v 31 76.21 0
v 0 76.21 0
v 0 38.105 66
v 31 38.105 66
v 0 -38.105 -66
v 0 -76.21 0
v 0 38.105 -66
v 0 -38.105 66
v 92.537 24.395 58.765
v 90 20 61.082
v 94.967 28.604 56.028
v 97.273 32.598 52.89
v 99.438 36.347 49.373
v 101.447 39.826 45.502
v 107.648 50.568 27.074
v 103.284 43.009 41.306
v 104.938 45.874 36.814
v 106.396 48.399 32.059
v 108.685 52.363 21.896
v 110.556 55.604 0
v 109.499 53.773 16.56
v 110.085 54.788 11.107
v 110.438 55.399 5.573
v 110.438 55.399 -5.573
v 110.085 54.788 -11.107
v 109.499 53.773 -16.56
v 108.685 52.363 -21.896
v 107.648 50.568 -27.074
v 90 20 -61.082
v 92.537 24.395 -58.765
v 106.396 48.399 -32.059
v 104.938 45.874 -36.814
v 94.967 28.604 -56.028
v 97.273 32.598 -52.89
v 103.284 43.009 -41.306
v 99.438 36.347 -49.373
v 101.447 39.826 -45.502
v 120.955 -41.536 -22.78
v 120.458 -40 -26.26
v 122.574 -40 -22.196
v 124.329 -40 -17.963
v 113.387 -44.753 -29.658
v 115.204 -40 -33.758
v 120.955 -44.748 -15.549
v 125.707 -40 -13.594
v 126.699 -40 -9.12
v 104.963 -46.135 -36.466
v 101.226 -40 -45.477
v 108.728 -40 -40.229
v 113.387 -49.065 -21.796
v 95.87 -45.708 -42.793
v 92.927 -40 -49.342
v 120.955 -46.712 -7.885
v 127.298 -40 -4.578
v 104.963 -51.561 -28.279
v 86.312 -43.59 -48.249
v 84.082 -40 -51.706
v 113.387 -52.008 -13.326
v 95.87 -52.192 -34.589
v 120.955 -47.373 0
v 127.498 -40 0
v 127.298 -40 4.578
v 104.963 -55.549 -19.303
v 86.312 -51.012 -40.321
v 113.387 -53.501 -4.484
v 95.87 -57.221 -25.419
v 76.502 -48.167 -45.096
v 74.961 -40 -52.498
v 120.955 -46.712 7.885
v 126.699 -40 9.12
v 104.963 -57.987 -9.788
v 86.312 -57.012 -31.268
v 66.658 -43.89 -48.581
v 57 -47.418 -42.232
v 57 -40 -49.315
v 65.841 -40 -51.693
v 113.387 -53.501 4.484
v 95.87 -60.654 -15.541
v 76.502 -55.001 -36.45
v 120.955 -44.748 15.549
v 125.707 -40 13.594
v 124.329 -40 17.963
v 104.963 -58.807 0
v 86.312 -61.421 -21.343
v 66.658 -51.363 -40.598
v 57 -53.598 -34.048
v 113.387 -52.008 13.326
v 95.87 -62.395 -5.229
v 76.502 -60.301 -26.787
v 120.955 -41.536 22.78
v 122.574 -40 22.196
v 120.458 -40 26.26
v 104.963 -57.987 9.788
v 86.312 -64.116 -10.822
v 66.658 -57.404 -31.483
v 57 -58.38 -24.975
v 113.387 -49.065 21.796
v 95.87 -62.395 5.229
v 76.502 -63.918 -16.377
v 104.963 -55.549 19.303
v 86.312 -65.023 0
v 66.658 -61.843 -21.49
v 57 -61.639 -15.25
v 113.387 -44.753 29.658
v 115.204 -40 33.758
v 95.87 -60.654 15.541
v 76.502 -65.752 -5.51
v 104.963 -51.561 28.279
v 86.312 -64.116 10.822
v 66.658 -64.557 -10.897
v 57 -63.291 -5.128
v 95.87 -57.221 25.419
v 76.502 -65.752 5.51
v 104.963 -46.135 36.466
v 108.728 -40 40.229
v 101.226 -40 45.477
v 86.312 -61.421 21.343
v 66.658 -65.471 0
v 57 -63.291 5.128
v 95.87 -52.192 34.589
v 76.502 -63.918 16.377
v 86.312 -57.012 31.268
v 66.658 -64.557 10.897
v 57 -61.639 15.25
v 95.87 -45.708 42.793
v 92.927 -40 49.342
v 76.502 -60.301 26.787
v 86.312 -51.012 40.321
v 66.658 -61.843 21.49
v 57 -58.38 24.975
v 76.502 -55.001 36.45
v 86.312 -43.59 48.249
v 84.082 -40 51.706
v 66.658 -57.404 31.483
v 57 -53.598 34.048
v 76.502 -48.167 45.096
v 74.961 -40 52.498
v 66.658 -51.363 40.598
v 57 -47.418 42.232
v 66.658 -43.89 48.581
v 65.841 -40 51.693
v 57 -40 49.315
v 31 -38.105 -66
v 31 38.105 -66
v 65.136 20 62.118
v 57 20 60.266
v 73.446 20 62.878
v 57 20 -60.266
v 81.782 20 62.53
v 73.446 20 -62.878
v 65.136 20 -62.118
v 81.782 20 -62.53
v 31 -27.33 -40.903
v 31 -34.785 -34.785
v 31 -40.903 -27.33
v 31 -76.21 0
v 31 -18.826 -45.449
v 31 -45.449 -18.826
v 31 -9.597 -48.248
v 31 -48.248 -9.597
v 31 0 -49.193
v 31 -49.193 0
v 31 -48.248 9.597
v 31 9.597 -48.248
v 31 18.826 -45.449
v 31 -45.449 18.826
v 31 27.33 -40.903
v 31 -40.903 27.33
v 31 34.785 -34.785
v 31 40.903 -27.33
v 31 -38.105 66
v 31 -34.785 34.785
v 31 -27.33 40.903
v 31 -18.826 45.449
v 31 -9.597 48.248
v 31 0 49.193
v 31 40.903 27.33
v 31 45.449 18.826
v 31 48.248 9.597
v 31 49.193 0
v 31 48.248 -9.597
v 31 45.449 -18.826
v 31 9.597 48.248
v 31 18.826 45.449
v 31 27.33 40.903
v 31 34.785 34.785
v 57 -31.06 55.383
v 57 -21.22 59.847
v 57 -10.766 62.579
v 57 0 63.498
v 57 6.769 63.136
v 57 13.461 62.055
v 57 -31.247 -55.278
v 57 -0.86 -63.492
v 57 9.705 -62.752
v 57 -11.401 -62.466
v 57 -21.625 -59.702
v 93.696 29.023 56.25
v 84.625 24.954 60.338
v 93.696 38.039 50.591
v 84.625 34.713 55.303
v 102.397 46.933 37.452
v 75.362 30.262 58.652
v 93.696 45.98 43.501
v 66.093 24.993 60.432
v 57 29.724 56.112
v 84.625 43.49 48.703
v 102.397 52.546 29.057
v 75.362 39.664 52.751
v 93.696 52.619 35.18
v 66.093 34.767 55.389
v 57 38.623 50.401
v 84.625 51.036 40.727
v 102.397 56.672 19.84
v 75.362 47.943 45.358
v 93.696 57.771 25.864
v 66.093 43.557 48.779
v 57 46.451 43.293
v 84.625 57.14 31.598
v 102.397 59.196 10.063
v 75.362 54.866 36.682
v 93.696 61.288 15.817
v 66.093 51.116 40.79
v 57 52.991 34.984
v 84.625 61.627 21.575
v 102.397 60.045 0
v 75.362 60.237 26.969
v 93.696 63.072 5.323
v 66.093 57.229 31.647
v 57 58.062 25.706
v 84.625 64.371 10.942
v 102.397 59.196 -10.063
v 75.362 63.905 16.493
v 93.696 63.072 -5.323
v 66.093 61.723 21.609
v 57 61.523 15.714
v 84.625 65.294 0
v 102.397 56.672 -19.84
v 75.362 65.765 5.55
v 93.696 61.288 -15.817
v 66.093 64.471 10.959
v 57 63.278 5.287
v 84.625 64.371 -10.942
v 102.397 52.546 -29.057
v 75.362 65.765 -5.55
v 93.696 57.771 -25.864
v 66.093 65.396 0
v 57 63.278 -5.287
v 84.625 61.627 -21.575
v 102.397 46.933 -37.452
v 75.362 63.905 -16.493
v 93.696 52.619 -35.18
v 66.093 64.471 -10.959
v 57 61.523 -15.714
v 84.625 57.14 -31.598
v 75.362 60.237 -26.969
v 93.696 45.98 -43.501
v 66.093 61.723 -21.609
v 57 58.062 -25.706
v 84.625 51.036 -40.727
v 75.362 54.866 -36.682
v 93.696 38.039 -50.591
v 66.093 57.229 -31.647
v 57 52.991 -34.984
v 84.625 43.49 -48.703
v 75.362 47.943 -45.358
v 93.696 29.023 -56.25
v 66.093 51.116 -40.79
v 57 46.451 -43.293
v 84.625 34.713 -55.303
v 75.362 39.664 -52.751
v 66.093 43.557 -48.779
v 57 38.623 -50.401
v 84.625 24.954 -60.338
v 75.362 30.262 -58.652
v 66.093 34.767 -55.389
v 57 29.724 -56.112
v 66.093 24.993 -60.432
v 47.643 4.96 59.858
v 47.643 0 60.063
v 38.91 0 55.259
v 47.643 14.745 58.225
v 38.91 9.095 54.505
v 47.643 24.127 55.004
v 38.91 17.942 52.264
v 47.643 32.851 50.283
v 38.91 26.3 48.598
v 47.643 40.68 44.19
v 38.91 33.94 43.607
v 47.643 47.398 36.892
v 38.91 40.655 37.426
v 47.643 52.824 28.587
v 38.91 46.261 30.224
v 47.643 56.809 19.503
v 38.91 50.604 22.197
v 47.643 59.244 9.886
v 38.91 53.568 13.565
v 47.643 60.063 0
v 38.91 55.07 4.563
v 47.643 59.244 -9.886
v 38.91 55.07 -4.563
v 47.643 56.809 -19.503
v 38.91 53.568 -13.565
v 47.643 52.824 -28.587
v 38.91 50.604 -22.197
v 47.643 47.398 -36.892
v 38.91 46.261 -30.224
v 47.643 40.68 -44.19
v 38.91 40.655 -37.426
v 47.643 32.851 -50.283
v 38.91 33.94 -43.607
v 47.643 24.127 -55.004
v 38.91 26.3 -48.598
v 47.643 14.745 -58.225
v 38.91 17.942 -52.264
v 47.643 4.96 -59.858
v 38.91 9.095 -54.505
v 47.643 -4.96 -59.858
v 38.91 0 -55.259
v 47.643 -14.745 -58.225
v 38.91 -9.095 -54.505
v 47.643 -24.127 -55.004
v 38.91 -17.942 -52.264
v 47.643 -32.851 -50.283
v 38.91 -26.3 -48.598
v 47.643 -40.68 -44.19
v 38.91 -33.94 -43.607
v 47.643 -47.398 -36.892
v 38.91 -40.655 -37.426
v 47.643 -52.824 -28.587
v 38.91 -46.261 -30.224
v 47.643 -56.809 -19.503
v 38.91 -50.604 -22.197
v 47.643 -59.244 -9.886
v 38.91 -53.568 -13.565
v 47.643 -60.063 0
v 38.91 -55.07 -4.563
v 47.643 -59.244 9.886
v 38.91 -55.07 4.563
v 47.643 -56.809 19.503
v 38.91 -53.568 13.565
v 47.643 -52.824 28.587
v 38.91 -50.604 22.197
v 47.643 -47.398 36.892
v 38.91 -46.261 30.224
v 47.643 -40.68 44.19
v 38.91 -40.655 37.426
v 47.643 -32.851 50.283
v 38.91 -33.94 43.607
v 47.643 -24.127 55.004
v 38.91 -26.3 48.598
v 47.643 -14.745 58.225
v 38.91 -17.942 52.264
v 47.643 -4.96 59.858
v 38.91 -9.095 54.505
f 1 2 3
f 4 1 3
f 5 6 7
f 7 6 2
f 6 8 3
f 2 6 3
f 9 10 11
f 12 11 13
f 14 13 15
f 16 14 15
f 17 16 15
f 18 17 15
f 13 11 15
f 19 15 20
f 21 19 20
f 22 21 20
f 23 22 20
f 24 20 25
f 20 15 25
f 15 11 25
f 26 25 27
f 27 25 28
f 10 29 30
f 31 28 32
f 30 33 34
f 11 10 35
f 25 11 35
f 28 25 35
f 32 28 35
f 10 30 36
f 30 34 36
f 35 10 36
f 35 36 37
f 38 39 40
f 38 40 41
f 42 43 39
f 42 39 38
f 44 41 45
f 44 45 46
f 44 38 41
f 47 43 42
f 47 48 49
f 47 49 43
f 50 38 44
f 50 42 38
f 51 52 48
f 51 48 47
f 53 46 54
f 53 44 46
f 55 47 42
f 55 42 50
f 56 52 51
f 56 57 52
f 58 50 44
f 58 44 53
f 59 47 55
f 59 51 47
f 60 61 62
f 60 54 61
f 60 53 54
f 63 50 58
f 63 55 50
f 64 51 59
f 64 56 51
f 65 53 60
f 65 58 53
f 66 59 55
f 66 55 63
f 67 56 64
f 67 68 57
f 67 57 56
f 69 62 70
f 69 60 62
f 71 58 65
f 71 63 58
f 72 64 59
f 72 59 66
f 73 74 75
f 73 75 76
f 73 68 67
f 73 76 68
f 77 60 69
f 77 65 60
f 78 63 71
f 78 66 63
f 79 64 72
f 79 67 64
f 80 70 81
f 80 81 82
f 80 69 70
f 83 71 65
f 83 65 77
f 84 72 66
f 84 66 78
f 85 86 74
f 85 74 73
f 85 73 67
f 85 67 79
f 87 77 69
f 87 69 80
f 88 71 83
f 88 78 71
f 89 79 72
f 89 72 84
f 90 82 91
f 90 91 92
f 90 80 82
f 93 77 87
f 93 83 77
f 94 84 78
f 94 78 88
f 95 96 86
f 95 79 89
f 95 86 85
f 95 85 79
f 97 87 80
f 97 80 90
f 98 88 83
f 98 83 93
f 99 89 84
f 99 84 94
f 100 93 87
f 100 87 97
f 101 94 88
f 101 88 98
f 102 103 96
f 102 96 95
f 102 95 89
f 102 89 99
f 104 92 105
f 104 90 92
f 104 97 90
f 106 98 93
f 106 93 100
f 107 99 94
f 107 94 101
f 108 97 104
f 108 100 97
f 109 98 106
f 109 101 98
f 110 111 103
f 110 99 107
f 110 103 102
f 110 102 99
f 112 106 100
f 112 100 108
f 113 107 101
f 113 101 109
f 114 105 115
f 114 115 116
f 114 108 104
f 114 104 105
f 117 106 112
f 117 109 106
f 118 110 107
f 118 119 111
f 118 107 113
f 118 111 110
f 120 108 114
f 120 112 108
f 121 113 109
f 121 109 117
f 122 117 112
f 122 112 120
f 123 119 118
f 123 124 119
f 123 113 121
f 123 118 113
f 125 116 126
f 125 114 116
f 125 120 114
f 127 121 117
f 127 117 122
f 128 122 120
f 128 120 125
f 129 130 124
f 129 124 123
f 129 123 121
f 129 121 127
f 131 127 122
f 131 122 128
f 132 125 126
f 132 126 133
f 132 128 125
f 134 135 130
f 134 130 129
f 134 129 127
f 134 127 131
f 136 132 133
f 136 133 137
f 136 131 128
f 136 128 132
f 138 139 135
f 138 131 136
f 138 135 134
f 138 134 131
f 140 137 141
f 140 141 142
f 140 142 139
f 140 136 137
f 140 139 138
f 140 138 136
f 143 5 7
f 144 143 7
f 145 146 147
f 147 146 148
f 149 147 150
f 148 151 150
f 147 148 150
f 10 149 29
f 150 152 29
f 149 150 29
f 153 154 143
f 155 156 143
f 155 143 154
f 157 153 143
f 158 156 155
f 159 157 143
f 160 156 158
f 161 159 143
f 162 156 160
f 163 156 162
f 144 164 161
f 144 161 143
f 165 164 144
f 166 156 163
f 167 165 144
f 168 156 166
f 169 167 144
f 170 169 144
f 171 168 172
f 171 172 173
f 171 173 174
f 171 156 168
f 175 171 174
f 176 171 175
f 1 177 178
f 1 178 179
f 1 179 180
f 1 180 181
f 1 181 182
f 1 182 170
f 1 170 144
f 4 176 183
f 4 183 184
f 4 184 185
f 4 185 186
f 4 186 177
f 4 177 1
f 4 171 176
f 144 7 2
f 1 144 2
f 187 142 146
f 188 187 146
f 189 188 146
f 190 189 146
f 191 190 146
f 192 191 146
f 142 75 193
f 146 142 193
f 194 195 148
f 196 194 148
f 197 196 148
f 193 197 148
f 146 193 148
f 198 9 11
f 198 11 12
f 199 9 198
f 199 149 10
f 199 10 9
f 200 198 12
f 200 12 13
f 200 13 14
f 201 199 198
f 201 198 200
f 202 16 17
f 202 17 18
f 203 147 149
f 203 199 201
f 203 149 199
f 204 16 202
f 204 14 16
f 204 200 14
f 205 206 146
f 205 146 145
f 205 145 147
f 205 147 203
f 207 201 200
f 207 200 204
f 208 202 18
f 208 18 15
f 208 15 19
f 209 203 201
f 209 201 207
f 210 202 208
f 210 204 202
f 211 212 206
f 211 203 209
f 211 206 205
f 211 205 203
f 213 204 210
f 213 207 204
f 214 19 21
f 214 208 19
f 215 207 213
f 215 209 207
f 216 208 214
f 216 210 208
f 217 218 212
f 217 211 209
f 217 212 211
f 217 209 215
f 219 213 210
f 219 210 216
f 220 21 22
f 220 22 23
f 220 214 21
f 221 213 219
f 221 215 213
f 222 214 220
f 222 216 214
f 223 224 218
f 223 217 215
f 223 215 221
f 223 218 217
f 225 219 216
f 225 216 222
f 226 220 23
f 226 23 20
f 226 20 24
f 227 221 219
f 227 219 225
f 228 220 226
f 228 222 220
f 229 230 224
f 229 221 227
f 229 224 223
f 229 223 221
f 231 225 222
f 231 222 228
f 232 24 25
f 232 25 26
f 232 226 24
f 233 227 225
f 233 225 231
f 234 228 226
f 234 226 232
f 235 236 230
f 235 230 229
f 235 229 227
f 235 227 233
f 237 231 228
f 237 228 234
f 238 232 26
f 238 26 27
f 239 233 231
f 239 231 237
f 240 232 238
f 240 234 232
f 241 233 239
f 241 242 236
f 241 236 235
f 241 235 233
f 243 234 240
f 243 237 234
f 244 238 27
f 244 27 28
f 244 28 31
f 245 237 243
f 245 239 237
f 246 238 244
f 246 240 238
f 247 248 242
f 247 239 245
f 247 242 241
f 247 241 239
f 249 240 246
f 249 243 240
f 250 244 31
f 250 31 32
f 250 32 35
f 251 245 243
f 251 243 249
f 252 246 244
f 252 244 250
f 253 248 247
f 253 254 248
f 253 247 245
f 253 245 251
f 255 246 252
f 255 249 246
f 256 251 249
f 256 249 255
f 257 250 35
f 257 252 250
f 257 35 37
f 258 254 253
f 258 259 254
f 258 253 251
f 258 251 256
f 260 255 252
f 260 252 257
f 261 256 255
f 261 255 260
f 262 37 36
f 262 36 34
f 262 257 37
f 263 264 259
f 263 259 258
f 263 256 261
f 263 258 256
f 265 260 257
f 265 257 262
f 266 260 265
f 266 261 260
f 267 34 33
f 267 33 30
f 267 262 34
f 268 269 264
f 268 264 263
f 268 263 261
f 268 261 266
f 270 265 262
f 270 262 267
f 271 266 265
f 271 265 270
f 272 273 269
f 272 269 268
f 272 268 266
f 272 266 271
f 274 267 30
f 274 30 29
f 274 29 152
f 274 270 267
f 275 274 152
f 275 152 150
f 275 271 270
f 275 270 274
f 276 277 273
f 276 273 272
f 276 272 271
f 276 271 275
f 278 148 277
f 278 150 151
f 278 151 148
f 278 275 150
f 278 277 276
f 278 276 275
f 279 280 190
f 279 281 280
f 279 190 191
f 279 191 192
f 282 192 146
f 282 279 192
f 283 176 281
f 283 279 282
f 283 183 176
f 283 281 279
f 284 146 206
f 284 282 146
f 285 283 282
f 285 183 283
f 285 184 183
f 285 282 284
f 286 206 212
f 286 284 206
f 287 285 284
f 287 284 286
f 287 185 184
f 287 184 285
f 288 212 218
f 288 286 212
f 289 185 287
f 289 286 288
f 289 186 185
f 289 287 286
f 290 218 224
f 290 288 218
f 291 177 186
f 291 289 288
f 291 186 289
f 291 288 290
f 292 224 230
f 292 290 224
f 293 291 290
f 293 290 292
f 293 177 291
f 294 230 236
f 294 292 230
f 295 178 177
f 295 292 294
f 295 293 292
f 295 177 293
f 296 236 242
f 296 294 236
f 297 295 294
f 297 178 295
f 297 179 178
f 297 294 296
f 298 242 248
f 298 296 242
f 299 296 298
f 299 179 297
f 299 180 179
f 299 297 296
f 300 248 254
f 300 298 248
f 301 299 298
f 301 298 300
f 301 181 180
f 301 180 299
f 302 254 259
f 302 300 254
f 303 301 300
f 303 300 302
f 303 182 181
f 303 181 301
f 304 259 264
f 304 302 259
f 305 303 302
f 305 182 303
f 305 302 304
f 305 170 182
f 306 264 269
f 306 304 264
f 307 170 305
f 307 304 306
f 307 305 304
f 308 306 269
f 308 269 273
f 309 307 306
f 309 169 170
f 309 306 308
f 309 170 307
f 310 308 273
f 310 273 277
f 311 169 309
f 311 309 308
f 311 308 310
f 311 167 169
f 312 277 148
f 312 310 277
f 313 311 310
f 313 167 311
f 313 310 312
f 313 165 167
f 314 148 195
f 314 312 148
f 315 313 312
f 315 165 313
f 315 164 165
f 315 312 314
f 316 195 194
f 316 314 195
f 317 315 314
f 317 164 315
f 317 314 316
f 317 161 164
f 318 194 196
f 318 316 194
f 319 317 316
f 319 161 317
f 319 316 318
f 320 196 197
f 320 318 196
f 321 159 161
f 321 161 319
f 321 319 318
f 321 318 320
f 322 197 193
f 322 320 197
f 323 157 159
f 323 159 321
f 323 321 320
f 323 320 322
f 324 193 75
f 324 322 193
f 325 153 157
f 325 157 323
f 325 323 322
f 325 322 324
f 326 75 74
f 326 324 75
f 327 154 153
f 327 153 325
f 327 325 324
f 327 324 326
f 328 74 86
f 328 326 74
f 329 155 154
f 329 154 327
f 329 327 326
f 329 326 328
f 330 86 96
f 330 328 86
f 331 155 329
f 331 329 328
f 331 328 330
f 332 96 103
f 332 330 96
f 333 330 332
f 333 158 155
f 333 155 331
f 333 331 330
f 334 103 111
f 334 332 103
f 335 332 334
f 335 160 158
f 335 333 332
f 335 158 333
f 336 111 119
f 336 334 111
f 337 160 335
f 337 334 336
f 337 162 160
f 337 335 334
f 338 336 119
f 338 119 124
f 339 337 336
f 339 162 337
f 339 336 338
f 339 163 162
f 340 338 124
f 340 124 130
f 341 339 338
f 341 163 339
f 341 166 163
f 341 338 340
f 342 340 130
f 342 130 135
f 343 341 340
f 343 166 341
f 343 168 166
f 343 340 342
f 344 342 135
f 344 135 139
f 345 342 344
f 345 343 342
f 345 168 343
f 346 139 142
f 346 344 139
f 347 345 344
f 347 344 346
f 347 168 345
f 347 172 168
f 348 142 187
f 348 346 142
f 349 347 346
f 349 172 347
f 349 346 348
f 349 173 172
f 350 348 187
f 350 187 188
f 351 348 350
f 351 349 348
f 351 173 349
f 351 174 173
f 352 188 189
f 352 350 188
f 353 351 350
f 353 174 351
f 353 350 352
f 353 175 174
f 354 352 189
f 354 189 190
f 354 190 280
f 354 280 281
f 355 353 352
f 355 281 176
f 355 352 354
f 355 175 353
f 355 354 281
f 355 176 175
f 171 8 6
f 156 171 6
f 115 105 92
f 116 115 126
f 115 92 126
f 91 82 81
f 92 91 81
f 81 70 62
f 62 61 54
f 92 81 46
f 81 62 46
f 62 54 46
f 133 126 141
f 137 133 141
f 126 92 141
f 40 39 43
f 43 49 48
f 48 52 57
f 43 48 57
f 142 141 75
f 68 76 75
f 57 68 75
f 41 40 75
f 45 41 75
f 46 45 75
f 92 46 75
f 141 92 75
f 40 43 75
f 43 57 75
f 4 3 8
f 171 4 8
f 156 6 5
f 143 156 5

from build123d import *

# Parameters (mm, degrees)
F1_DEPTH = 31
F6_DEPTH = 138
F9_DEPTH = 188


with BuildPart() as f1:
    # F0 (on Right) → F1 (new body)
    with BuildSketch(Plane.YZ):
        Polygon((38.1051177665, 66), (-38.1051177665, 66), (-76.210235533, 0), (-38.1051177665, -66), (38.1051177665, -66), (76.210235533, 0), align=None)
    extrude(amount=F1_DEPTH)

    # F2 (on Front) → F3 (revolve)
    with BuildSketch(Plane.XZ):
        with BuildLine():
            Line((31, 0), (141, 0))
            ThreePointArc((141, 0), (114.7994974843, 52.6497863244), (57, 63.4980314656))
            ThreePointArc((57, 63.4980314656), (43.1856174465, 57.8259895094), (31, 49.193495505))
            Line((31, 49.193495505), (31, 0))
        make_face()
    revolve(axis=Axis((75, 0, 0), (-1, 0, 0)))

    # F5 (on offset) → F6 (cut)
    with BuildSketch(Plane(origin=(0, 0, -66), x_dir=(1, 0, 0), z_dir=(0, 0, -1))):
        with BuildLine():
            Line((57, -20), (137.8967407741, -20))
            ThreePointArc((137.8967407741, -20), (140.0304895149, 11.2709996651), (127.4976189936, 40))
            Line((127.4976189936, 40), (75, 40))
            Line((75, 40), (57, 40))
            Line((57, 40), (57, 0))
            Line((57, 0), (57, -20))
        make_face()
    extrude(amount=-F6_DEPTH, mode=Mode.SUBTRACT)

    # F8 (on offset) → F9 (cut)
    with BuildSketch(Plane(origin=(0, 0, -66), x_dir=(1, 0, 0), z_dir=(0, 0, -1))):
        with BuildLine():
            Line((90, -20), (110.5558559129, -55.6037868342))
            ThreePointArc((110.5558559129, -55.6037868342), (127.3463070124, -40.197812654), (137.8967407741, -20))
            Line((137.8967407741, -20), (90, -20))
        make_face()
    extrude(amount=-F9_DEPTH, mode=Mode.SUBTRACT)


solid = f1.part
